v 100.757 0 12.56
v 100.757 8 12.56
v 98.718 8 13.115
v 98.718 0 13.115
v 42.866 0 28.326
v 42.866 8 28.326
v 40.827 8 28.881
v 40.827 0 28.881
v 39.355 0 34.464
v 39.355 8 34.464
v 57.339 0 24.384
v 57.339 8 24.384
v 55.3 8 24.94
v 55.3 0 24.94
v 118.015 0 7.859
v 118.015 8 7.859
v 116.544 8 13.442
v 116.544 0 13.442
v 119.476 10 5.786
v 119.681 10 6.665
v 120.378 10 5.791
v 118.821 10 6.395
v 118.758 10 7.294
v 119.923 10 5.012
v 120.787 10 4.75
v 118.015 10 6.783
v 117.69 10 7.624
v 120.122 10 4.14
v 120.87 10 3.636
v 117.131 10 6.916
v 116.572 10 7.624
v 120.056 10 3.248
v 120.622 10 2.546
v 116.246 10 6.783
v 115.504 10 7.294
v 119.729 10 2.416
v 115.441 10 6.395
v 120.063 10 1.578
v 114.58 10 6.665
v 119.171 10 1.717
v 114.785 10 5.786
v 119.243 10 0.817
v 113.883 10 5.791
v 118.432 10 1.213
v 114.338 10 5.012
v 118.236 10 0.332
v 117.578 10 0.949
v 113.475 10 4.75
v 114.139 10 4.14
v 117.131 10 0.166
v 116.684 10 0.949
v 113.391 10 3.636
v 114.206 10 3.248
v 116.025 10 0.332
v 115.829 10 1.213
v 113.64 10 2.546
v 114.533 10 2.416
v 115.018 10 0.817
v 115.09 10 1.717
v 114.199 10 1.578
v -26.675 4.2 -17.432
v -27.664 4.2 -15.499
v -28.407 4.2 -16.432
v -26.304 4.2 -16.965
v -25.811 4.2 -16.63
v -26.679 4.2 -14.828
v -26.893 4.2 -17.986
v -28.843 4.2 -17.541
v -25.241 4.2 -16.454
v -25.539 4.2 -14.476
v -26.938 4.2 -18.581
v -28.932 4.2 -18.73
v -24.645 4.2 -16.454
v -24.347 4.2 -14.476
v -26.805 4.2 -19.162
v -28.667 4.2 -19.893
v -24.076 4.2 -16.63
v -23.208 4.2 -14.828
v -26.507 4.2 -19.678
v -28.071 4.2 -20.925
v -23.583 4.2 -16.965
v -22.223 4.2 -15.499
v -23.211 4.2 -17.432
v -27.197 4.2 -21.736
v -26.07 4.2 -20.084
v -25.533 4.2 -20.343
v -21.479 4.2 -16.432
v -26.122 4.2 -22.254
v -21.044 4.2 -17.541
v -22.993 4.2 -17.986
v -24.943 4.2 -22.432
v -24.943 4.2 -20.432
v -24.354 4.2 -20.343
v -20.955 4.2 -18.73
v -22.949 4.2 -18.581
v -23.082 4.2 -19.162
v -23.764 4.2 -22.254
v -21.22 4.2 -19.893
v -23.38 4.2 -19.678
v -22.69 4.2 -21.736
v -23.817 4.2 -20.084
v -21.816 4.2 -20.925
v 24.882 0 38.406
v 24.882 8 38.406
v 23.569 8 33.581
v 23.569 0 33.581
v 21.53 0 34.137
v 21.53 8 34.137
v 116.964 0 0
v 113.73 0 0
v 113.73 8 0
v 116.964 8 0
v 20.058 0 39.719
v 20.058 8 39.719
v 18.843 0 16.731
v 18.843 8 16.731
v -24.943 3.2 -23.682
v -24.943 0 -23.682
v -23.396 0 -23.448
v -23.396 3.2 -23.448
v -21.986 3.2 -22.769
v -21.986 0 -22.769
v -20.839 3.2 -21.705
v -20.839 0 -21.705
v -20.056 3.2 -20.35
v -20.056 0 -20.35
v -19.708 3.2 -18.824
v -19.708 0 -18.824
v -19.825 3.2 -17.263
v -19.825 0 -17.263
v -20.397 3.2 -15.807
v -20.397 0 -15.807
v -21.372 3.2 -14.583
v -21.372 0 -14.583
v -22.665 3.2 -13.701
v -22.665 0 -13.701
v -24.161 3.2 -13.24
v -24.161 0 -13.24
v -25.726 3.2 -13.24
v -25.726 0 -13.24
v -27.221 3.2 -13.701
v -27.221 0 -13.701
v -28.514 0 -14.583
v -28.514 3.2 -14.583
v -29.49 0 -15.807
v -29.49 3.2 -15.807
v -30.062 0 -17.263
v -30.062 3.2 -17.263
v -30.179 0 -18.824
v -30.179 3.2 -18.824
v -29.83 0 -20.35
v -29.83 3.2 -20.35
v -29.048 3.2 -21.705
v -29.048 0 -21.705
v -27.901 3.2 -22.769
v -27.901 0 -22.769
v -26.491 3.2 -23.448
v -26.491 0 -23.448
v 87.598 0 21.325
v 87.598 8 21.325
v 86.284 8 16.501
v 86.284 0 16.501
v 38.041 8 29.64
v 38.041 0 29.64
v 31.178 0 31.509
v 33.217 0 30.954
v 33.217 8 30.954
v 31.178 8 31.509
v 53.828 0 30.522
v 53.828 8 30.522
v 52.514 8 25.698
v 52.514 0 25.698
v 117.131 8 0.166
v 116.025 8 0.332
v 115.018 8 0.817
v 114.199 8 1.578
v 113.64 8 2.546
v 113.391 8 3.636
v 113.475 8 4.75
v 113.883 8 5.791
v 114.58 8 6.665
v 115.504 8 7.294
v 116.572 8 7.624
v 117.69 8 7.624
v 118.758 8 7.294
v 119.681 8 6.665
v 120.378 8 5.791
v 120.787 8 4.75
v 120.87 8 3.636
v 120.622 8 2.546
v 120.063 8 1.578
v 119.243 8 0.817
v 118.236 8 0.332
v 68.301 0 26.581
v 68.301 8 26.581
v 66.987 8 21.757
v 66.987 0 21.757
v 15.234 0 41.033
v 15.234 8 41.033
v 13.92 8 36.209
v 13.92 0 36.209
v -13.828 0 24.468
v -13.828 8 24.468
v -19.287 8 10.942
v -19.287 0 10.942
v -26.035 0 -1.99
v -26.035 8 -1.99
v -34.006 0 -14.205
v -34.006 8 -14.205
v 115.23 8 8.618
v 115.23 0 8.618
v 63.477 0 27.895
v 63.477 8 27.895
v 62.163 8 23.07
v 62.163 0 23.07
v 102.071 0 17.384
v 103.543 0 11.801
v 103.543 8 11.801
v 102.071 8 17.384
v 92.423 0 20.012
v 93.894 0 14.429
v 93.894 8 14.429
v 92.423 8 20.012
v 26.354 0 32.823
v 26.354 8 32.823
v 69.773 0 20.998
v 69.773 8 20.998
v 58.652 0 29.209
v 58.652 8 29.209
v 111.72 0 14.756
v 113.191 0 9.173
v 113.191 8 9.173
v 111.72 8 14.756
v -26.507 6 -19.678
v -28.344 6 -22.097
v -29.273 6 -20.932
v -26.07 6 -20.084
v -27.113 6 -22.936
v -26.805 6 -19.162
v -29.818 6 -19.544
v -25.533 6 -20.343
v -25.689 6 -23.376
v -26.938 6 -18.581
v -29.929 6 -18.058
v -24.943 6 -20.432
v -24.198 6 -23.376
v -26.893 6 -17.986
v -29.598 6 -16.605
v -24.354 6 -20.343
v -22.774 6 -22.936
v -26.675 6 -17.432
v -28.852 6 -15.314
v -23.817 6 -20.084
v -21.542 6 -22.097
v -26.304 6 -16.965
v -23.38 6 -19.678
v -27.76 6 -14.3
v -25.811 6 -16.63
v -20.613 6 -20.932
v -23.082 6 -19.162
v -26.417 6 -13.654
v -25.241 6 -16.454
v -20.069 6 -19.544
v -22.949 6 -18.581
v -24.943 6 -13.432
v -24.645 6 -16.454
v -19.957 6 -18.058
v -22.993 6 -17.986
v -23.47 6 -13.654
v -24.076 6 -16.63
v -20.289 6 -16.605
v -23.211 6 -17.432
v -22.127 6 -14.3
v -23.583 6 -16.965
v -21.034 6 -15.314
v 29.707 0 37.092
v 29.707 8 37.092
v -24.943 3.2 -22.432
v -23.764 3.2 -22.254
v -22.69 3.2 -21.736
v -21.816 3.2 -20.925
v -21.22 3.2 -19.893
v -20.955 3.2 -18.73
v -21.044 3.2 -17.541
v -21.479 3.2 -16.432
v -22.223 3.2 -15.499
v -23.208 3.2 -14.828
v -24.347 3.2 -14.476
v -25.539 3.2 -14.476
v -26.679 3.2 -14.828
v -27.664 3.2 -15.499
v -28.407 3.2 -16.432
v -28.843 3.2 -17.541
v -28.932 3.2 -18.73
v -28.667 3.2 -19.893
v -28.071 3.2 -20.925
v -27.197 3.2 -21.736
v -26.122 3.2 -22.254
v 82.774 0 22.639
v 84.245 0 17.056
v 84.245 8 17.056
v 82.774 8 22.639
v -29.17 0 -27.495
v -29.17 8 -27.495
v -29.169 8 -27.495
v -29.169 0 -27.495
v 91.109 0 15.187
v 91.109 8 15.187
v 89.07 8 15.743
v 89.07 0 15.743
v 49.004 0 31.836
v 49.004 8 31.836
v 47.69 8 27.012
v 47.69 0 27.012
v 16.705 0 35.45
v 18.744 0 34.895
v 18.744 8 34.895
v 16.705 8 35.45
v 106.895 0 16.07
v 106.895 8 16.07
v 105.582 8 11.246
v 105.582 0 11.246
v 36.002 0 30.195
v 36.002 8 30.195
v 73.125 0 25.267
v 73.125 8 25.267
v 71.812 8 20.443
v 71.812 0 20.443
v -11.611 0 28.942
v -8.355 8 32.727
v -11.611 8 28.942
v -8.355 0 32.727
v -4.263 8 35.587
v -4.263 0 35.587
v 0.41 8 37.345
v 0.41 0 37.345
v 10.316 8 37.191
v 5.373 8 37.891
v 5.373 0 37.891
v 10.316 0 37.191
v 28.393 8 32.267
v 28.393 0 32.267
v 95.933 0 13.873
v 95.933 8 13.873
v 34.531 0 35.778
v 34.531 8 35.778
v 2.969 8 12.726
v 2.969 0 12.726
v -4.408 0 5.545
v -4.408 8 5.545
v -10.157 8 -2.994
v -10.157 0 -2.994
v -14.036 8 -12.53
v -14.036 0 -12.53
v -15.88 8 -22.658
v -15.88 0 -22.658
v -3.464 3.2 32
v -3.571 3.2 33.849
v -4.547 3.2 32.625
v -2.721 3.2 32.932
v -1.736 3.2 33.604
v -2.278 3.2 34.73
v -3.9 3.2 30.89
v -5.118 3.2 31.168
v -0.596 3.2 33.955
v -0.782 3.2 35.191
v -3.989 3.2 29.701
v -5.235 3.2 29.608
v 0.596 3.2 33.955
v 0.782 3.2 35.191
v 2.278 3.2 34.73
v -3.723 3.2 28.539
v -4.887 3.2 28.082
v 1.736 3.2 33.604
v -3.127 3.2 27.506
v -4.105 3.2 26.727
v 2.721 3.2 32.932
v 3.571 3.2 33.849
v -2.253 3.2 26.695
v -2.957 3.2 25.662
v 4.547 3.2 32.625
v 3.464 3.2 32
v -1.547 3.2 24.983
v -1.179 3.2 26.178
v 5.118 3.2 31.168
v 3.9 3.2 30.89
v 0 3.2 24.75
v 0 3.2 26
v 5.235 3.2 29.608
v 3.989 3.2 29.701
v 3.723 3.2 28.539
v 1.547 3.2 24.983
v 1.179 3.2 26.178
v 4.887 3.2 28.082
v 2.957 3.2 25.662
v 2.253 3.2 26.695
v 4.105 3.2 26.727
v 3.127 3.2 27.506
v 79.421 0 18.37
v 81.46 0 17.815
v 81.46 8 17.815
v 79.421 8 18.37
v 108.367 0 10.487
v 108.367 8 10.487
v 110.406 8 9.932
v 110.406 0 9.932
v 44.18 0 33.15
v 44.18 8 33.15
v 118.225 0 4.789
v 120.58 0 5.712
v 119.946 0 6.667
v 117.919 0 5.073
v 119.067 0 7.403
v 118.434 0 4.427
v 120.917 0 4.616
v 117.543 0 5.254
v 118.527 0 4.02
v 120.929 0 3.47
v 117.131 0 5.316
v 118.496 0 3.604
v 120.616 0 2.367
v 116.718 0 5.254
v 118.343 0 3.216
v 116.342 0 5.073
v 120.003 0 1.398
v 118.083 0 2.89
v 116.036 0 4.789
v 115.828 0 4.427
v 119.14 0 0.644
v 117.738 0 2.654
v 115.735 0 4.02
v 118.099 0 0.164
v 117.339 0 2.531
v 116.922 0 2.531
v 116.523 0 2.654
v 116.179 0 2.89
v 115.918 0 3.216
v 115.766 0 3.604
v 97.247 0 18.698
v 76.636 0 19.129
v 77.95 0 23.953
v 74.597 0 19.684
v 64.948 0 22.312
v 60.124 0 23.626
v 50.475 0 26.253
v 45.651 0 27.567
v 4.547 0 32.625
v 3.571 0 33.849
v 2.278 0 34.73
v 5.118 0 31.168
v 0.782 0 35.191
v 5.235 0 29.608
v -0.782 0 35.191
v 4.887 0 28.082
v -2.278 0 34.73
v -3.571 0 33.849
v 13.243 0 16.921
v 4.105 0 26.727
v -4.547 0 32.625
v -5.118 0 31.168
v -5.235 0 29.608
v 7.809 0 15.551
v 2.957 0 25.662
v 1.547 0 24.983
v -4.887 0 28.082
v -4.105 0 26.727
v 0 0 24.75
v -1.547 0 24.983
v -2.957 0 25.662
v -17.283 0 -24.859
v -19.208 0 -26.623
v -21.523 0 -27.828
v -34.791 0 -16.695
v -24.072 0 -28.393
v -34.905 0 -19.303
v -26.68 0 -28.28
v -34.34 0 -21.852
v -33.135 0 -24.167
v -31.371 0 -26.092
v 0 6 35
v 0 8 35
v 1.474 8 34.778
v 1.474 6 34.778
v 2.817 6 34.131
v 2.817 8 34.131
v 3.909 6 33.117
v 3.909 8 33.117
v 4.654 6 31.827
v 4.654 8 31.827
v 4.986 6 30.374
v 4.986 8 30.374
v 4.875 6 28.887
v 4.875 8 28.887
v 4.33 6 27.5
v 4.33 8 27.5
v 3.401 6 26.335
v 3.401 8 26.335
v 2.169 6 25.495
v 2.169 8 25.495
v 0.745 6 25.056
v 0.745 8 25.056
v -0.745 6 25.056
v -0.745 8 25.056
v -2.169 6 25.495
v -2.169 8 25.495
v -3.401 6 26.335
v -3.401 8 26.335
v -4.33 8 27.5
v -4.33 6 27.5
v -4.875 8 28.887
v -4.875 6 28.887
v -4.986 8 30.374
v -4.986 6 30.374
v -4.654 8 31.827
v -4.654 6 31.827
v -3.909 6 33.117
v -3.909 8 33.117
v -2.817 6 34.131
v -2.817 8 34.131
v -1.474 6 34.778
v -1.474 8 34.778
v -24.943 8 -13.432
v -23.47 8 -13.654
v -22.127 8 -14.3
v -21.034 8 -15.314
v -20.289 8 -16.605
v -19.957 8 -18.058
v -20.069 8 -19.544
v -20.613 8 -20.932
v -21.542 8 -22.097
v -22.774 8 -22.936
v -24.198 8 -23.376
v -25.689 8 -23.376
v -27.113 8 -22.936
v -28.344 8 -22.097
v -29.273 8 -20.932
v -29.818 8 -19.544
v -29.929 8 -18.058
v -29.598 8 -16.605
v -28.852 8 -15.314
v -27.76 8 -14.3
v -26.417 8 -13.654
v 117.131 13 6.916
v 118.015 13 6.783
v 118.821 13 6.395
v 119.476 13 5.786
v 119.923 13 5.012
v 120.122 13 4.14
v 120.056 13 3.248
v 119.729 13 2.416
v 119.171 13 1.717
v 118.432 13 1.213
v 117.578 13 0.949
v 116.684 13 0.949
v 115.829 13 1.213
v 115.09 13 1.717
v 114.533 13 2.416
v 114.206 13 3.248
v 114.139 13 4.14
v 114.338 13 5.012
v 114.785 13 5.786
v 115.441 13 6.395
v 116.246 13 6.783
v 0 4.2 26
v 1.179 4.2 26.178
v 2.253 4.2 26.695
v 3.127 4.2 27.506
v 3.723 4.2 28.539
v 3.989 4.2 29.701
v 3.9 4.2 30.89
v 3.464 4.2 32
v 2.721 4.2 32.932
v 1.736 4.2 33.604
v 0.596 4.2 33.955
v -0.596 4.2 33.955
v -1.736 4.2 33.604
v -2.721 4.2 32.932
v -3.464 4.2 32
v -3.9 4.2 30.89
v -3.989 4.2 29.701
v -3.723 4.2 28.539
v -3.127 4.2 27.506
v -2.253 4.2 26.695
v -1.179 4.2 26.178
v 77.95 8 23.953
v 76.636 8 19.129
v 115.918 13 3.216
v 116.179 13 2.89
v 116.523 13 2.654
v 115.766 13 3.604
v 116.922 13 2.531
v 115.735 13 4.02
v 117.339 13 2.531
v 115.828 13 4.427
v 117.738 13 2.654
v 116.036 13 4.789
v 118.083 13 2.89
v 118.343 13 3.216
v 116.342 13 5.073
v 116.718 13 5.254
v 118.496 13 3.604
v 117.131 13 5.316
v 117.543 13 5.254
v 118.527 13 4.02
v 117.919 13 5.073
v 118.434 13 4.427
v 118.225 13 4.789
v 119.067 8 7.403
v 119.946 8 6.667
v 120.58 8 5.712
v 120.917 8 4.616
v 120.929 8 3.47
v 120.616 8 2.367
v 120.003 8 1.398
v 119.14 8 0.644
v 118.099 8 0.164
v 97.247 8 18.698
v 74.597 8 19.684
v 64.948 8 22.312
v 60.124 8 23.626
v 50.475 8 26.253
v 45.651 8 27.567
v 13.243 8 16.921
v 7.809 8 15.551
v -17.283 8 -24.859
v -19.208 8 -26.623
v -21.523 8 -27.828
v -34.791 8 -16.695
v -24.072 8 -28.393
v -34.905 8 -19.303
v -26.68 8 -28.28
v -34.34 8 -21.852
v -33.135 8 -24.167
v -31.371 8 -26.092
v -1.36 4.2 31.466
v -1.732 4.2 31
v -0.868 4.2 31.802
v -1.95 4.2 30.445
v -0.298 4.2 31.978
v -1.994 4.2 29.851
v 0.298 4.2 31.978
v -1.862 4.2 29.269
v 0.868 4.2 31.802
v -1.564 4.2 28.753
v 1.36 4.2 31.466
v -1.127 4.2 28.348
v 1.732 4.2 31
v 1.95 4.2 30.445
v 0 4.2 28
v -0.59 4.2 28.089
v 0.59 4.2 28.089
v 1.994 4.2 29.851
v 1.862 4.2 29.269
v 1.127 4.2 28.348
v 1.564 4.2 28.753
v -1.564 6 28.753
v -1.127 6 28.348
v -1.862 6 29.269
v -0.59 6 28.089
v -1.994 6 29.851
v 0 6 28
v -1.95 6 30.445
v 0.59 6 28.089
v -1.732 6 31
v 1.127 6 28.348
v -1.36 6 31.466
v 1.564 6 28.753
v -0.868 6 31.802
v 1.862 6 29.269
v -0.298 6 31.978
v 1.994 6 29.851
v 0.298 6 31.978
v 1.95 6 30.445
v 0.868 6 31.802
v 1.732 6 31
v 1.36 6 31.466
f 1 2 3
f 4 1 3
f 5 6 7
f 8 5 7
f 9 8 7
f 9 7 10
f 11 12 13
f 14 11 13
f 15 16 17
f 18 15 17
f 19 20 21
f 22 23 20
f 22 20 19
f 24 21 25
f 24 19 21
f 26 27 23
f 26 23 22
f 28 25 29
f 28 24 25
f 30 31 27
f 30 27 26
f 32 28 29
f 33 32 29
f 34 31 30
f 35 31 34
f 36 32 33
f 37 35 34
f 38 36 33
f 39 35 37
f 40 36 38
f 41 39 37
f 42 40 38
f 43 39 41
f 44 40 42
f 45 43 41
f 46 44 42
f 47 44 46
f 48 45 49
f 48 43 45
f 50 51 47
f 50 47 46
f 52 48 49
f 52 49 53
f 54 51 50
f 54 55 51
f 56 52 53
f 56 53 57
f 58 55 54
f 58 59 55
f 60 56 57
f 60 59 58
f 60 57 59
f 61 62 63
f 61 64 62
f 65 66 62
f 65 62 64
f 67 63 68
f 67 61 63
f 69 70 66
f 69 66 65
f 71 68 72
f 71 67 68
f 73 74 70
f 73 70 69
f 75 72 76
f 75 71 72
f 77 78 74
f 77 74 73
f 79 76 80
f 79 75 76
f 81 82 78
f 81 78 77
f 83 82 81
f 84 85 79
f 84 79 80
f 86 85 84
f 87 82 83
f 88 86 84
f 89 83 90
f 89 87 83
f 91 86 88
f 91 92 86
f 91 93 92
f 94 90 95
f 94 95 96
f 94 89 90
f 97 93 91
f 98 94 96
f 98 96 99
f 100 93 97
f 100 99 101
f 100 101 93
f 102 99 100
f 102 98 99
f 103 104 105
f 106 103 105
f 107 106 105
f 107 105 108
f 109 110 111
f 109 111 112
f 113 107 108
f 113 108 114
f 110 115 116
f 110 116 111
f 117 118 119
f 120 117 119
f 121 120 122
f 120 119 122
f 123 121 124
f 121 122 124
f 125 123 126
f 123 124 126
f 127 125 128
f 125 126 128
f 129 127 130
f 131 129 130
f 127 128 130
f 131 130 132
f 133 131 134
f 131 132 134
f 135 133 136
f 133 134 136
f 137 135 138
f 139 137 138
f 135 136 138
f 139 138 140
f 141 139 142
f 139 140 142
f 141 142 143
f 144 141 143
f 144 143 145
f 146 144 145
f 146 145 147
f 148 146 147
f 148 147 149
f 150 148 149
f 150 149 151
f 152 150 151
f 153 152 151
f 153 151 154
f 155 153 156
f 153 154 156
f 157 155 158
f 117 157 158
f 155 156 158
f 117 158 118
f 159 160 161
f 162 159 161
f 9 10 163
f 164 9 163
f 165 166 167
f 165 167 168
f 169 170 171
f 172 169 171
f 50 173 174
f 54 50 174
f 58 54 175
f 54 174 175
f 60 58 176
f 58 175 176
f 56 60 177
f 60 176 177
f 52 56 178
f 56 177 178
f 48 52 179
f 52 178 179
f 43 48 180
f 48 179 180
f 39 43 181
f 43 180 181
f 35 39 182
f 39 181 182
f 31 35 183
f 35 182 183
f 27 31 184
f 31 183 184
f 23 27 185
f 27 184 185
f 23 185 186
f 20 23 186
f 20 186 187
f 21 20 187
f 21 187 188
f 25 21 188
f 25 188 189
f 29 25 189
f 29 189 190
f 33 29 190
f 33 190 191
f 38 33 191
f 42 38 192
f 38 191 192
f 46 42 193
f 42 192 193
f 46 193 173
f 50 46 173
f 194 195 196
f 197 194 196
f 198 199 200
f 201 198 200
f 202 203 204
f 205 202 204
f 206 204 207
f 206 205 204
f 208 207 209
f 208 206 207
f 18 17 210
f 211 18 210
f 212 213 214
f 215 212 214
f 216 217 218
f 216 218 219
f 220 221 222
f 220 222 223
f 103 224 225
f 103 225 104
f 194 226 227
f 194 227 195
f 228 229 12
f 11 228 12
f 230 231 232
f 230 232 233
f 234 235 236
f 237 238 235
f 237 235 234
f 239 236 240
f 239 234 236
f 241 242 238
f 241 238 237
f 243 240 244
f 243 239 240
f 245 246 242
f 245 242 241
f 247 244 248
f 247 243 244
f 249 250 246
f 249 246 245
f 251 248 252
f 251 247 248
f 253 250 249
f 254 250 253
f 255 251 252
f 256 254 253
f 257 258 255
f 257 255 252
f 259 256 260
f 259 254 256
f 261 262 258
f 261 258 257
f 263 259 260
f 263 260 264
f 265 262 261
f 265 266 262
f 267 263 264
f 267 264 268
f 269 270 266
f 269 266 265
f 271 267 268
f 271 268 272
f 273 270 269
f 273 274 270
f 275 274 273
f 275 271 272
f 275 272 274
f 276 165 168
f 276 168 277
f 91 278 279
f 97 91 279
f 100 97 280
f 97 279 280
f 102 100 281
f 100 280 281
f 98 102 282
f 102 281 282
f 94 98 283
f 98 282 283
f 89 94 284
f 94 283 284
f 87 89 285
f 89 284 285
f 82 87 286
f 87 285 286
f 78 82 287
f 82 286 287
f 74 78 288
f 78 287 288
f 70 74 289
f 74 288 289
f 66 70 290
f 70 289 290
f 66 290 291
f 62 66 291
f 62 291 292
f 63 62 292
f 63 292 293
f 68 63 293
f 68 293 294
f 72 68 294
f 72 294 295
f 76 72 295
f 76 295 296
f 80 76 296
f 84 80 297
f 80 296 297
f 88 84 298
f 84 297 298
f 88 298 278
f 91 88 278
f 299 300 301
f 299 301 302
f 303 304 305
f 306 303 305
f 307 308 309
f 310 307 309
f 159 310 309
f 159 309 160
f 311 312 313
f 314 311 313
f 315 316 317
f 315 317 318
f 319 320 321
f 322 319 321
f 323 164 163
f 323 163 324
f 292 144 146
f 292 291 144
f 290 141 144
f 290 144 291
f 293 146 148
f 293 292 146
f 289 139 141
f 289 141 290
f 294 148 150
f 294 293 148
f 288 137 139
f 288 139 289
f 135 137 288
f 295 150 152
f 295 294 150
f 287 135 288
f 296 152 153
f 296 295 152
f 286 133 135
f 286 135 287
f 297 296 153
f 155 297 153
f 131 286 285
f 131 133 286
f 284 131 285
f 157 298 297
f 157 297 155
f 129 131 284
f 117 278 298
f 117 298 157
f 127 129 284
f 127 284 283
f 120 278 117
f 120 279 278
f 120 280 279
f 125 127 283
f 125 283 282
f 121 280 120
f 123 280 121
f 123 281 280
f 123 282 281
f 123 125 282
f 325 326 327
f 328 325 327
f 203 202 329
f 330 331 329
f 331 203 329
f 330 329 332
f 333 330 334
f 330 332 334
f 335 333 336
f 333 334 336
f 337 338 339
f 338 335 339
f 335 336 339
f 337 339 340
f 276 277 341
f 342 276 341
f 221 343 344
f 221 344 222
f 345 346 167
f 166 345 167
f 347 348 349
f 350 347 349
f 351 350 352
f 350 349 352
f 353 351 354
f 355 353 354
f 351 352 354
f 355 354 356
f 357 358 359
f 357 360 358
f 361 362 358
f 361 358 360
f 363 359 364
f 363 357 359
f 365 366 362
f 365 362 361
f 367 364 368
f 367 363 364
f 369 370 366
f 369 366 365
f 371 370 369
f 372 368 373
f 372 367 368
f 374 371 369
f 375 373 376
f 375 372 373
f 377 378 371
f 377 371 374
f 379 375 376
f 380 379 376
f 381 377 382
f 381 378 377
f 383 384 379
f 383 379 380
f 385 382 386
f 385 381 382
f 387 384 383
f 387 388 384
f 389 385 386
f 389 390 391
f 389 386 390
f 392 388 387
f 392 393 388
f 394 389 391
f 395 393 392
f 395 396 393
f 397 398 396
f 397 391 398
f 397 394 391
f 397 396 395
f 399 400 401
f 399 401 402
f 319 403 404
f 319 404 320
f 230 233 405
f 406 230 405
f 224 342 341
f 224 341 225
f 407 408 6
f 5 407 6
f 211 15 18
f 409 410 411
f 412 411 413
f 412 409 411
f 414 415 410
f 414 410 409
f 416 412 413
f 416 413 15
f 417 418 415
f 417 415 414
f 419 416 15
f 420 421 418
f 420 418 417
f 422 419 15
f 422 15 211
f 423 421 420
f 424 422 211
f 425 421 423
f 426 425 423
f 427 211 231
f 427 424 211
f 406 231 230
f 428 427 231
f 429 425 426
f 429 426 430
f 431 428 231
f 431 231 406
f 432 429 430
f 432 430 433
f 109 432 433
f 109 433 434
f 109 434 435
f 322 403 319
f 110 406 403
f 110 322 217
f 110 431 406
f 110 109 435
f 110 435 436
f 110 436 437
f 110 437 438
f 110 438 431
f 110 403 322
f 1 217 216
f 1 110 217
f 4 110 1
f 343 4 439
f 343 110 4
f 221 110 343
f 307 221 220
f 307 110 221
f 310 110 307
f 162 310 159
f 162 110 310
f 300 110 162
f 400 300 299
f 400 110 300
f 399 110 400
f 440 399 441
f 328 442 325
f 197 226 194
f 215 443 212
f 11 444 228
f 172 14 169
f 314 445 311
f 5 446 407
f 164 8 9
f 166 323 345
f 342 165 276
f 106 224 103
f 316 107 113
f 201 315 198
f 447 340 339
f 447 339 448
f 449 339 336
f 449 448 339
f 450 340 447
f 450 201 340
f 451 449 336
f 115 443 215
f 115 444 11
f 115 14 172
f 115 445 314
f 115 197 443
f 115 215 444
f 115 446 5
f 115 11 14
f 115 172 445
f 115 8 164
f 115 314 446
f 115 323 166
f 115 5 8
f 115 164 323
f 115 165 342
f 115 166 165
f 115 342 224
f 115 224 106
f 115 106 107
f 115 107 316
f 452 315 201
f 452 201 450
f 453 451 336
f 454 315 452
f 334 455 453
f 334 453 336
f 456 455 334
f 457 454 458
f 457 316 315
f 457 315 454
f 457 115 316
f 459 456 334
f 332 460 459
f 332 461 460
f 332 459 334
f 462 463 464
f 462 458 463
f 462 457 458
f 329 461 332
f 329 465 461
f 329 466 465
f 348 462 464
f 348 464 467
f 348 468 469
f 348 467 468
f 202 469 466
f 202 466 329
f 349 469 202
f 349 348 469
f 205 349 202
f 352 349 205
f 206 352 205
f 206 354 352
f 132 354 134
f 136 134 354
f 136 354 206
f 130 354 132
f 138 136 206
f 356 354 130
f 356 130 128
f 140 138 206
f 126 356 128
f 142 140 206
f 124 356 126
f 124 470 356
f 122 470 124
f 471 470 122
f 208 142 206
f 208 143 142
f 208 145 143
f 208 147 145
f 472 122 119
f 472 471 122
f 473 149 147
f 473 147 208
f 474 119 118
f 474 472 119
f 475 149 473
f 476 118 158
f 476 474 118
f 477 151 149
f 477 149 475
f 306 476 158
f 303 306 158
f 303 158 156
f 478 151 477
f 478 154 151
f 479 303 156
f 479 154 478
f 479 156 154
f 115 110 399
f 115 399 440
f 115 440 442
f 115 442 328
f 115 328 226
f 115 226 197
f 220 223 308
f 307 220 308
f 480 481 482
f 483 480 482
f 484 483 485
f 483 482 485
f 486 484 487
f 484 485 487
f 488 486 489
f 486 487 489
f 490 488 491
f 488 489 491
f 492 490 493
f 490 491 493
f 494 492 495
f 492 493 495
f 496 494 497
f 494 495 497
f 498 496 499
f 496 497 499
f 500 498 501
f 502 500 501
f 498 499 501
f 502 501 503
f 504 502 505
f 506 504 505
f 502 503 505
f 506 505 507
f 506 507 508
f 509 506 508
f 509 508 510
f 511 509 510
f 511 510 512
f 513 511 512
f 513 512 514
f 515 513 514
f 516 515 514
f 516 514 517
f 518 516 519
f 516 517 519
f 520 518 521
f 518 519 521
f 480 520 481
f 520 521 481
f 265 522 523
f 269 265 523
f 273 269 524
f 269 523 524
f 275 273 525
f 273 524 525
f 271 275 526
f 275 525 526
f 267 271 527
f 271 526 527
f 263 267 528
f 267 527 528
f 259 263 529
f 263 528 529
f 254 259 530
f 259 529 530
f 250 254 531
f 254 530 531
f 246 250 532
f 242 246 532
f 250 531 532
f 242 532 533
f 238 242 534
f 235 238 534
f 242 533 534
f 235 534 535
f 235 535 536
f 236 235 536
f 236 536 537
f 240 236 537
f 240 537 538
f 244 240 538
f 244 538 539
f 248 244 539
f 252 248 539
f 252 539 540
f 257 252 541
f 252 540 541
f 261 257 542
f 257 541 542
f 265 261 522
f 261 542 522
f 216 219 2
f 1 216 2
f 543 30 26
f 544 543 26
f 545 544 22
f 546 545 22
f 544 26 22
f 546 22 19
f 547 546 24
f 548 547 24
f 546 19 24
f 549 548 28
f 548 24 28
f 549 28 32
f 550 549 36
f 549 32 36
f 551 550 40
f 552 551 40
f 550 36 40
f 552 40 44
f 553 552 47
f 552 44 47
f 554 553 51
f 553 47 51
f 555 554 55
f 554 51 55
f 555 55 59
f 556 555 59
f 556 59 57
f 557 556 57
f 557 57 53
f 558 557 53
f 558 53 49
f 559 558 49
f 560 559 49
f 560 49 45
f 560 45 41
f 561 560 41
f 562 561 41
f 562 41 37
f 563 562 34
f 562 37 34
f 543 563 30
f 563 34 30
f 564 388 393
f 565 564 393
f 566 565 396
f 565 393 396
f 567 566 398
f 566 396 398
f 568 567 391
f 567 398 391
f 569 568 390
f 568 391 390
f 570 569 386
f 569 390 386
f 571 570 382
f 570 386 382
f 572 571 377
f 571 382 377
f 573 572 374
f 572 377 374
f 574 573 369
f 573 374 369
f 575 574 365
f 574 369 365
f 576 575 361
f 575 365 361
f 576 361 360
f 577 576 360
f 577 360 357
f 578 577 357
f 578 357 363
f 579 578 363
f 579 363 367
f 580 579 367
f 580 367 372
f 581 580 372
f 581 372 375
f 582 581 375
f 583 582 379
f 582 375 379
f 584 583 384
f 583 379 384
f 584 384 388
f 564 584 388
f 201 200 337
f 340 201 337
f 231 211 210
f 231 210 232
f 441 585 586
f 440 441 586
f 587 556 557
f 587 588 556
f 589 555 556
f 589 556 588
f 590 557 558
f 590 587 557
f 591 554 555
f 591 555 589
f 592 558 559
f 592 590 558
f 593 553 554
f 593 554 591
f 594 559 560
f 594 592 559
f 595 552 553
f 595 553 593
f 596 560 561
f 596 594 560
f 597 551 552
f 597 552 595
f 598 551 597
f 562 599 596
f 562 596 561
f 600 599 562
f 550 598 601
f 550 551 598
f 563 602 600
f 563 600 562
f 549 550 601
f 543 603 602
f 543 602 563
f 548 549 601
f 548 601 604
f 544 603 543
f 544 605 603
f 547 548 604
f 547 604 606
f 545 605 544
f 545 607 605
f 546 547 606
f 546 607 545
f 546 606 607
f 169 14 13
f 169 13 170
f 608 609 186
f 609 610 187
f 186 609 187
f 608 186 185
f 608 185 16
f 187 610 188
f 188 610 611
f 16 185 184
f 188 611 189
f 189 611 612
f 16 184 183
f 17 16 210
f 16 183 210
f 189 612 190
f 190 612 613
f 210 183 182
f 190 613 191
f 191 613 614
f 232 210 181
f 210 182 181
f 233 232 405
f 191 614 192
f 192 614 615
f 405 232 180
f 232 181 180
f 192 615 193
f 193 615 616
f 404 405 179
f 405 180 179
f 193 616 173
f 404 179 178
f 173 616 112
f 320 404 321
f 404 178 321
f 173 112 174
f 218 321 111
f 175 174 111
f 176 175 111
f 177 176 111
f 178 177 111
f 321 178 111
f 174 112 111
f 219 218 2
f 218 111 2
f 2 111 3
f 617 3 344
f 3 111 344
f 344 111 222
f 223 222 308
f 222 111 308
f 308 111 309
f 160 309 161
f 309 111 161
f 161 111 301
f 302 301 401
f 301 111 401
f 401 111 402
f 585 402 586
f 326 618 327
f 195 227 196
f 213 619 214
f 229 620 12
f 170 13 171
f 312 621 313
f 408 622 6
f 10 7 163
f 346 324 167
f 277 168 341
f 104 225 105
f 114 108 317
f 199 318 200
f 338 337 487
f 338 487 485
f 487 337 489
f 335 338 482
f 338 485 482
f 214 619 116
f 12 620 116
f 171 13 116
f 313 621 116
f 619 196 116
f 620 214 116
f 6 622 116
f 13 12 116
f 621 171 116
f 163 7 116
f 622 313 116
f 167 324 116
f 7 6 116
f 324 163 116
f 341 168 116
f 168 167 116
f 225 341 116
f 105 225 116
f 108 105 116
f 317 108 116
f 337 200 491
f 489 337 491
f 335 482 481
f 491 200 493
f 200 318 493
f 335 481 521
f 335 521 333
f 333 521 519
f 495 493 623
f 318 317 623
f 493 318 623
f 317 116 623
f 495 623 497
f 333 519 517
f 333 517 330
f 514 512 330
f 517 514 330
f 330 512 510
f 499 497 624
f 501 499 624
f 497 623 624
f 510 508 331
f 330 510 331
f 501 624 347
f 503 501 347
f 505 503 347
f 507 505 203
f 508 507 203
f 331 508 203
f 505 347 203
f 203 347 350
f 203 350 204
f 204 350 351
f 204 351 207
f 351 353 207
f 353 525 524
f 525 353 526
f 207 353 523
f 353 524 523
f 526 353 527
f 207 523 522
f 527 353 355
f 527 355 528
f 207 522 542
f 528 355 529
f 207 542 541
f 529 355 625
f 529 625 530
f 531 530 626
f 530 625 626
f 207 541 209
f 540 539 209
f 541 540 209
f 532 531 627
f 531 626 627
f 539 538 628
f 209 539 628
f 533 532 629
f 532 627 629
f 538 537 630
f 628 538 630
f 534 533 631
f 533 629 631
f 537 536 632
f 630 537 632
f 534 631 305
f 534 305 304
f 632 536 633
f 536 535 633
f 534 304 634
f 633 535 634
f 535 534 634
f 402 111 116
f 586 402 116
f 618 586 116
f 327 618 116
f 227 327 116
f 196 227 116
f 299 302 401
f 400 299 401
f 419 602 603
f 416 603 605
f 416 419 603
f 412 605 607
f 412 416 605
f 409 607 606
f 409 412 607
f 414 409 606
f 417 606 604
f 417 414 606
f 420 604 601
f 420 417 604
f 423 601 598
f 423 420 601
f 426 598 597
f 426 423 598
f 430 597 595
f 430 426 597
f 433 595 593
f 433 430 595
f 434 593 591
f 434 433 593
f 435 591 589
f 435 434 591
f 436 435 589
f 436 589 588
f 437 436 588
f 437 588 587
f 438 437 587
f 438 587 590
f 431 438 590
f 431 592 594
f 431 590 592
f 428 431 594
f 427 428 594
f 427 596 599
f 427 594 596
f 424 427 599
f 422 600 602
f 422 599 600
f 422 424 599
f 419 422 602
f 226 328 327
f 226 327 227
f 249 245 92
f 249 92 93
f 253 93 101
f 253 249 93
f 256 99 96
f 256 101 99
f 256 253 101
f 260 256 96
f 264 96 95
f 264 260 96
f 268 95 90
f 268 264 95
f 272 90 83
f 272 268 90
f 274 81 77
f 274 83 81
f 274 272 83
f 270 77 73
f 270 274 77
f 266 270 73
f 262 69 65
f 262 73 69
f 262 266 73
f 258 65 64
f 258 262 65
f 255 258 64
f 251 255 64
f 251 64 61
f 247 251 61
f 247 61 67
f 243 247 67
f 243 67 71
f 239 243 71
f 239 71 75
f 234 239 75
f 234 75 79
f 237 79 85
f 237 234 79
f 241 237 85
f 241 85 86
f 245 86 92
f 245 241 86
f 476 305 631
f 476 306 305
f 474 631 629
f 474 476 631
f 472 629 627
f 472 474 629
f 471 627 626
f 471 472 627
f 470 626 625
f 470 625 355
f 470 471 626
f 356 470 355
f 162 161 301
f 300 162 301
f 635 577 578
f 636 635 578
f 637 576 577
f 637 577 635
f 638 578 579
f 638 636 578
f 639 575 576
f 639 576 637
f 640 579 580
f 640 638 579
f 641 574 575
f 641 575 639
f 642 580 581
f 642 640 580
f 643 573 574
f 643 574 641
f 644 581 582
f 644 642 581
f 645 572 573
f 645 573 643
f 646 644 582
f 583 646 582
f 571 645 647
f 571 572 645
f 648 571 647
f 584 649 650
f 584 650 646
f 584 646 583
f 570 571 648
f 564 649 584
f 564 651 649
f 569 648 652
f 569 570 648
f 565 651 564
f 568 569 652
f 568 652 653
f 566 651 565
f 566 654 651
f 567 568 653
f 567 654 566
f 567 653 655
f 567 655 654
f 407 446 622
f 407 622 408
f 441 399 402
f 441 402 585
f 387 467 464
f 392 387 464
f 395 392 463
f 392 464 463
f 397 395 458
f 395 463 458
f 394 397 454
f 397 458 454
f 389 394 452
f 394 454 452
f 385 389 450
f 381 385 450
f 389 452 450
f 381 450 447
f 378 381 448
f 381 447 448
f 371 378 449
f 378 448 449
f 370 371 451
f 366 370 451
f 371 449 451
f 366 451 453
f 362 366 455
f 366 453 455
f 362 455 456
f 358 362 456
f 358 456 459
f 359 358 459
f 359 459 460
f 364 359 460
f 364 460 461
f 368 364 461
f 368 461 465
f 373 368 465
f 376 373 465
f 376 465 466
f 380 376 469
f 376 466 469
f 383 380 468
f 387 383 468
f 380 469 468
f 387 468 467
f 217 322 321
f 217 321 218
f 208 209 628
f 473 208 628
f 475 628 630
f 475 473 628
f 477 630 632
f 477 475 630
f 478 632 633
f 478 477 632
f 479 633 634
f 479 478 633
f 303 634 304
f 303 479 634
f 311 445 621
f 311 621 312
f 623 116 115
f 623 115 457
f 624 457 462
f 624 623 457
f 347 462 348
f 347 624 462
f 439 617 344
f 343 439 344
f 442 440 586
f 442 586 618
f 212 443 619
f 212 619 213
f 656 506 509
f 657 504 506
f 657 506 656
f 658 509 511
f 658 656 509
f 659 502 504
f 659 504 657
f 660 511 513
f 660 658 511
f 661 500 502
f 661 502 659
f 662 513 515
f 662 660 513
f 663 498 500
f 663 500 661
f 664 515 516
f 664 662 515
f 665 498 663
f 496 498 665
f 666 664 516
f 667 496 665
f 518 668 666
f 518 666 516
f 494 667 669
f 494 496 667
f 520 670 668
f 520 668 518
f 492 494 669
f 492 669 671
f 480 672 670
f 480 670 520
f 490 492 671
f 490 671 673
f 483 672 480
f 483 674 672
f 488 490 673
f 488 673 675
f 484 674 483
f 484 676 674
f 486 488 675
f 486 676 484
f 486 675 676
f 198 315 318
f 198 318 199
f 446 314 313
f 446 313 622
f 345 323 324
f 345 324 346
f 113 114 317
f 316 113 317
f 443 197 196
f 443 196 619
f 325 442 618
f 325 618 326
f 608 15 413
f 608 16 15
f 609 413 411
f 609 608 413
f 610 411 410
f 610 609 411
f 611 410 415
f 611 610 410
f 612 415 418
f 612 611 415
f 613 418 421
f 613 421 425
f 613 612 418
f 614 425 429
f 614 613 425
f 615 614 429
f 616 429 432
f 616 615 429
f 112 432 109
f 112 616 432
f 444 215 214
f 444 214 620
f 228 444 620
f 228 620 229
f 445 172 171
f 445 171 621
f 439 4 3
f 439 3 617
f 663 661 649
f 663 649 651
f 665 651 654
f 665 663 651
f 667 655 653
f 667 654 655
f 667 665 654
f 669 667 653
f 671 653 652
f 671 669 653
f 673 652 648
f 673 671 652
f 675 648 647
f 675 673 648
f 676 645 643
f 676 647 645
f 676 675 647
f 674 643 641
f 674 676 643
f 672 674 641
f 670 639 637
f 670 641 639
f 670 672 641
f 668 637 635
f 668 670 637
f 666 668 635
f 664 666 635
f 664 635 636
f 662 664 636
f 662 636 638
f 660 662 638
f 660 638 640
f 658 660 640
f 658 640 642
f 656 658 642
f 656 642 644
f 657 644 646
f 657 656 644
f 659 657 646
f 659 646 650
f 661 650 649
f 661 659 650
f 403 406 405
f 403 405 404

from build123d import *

# Parameters (mm, degrees)
SKETCH1_R                = 1.4
BOSS_EXTRUDE1_DEPTH      = 8
SKETCH2_R                = 3.75
BOSS_EXTRUDE2_DEPTH      = 2
SKETCH3_R                = 3
BOSS_EXTRUDE3_DEPTH      = 3
CUT_EXTRUDE1_DEPTH       = 153.777621068
CUT_EXTRUDE1_DEPTH_BACK  = 153.777621068
SKETCH4_R                = 1.4
FILLET1_R                = 4
SKETCH5_R                = 5.1
CUT_EXTRUDE2_DEPTH       = 3.2
SKETCH6_R                = 4
CUT_EXTRUDE3_DEPTH       = 1
SKETCH7_R                = 5
CUT_EXTRUDE4_DEPTH       = 2
CUT_EXTRUDE5_DEPTH       = 128.709870942
CUT_EXTRUDE5_DEPTH_BACK  = 128.709870942
SKETCH8_R                = 2
SKETCH9_W                = 150
SKETCH9_H                = 50
CUT_EXTRUDE6_DEPTH       = 128.657240829
BOSS_EXTRUDE4_DEPTH      = 8
FILLET2_R                = 10
SKETCH11_R               = 5.25
CUT_EXTRUDE7_DEPTH       = 3.2
SKETCH12_R               = 4
CUT_EXTRUDE8_DEPTH       = 1
SKETCH13_R               = 5
CUT_EXTRUDE9_DEPTH       = 2
CUT_EXTRUDE10_DEPTH      = 128.709870942
CUT_EXTRUDE10_DEPTH_BACK = 128.709870942
SKETCH14_R               = 2
CUT_EXTRUDE11_DEPTH      = 128.657240829
CUT_EXTRUDE11_DEPTH_BACK = 128.657240829
FILLET3_R                = 20
CUT_EXTRUDE12_DEPTH      = 128.657240829
CUT_EXTRUDE12_DEPTH_BACK = 128.657240829
FILLET4_R                = 20
FILLET5_R                = 20
BOSS_EXTRUDE5_DEPTH      = 8
LPATTERN1_COUNT          = 22
LPATTERN1_PITCH          = 5
SKETCH19_R               = 5.25
CUT_EXTRUDE13_DEPTH      = 3.2
SKETCH20_R               = 4
CUT_EXTRUDE14_DEPTH      = 1
CUT_EXTRUDE15_DEPTH      = 129.03726605
CUT_EXTRUDE15_DEPTH_BACK = 129.03726605
SKETCH21_R               = 2
SKETCH22_R               = 5
CUT_EXTRUDE16_DEPTH      = 2


# Some blends are built 0.0001 mm under size
with BuildPart() as part:
    # Sketch1 → Boss-Extrude1 (new body)
    with BuildSketch(Plane(origin=(0, 0, 0), x_dir=(1, 0, 0), z_dir=(0, 1, 0))):
        Polygon((-146.874100845, 0), (146.874100845, 0), (0, -40), align=None)
        with Locations(Location((-117.130755004, -3.915785767, 0), (0, 0, 270))):
            Circle(SKETCH1_R, mode=Mode.SUBTRACT)
        with Locations(Location((0, -30, 0), (0, 0, 270))):
            Circle(SKETCH1_R, mode=Mode.SUBTRACT)
        with Locations(Location((117.130755004, -3.915785767, 0), (0, 0, 270))):
            Circle(SKETCH1_R, mode=Mode.SUBTRACT)
    extrude(amount=BOSS_EXTRUDE1_DEPTH)

    # Sketch2 → Boss-Extrude2 (add)
    with BuildSketch(Plane(origin=(0, 8, 0), x_dir=(1, 0, 0), z_dir=(0, 1, 0))):
        with Locations(Location((117.130755004, -3.915785767, 0), (0, 0, 90))):
            Circle(SKETCH2_R)
    extrude(amount=BOSS_EXTRUDE2_DEPTH)

    # Sketch3 → Boss-Extrude3 (add)
    with BuildSketch(Plane(origin=(0, 10, 0), x_dir=(1, 0, 0), z_dir=(0, 1, 0))):
        with Locations(Location((117.130755004, -3.915785767, 0), (0, 0, 270))):
            Circle(SKETCH3_R)
    extrude(amount=BOSS_EXTRUDE3_DEPTH)

    # Sketch4 → Cut-Extrude1 (cut, two sides: drawn at the far end of the back side and taken through both)
    with BuildSketch(Plane(origin=(0, 13, 0), x_dir=(1, 0, 0), z_dir=(0, 1, 0)).offset(-CUT_EXTRUDE1_DEPTH_BACK)):
        with Locations(Location((117.130755004, -3.915785767, 0), (0, 0, 270))):
            Circle(SKETCH4_R)
    extrude(amount=CUT_EXTRUDE1_DEPTH + CUT_EXTRUDE1_DEPTH_BACK, mode=Mode.SUBTRACT)

    # Fillet1
    fillet1_edges = [part.edges().sort_by_distance(p)[0] for p in [
        (-146.874100845, 4, 0),
        (146.874100845, 4, 0),
    ]]
    fillet(fillet1_edges, radius=FILLET1_R)

    # Sketch5 → Cut-Extrude2 (cut)
    with BuildSketch(Plane.XZ):
        with Locations((-117.130755004, 3.915785767)):
            Circle(SKETCH5_R)
    extrude(amount=-CUT_EXTRUDE2_DEPTH, mode=Mode.SUBTRACT)

    # Sketch6 → Cut-Extrude3 (cut)
    with BuildSketch(Plane.XZ.offset(-3.2)):
        with Locations((-117.130755004, 3.915785767)):
            Circle(SKETCH6_R)
    extrude(amount=-CUT_EXTRUDE3_DEPTH, mode=Mode.SUBTRACT)

    # Sketch7 → Cut-Extrude4 (cut)
    with BuildSketch(Plane(origin=(0, 8, 0), x_dir=(1, 0, 0), z_dir=(0, 1, 0))):
        with Locations((-117.130755004, -3.915785767)):
            Circle(SKETCH7_R)
    extrude(amount=-CUT_EXTRUDE4_DEPTH, mode=Mode.SUBTRACT)

    # Sketch8 → Cut-Extrude5 (cut, two sides: drawn at the far end of the back side and taken through both)
    with BuildSketch(Plane.XZ.offset(-4.2).offset(-CUT_EXTRUDE5_DEPTH_BACK)):
        with Locations(Location((-117.130755004, 3.915785767, 0), (0, 0, 270))):
            Circle(SKETCH8_R)
    extrude(amount=CUT_EXTRUDE5_DEPTH + CUT_EXTRUDE5_DEPTH_BACK, mode=Mode.SUBTRACT)

    # Sketch9 → Cut-Extrude6 (cut, through all)
    with BuildSketch(Plane(origin=(0, 8, 0), x_dir=(1, 0, 0), z_dir=(0, 1, 0))):
        with Locations((-85, -25)):
            Rectangle(SKETCH9_W, SKETCH9_H)
    extrude(amount=-CUT_EXTRUDE6_DEPTH, mode=Mode.SUBTRACT)

    # Sketch10 → Boss-Extrude4 (add)
    with BuildSketch(Plane(origin=(0, 8, 0), x_dir=(1, 0, 0), z_dir=(0, 1, 0))):
        Polygon((-10, -37.276579072), (-38.232590814, 23.268407311), (-20.106435073, 31.720772546), (-5.314795912, 0), (-10, 0), align=None)
    extrude(amount=-BOSS_EXTRUDE4_DEPTH)

    # Fillet2
    fillet2_edges = [part.edges().sort_by_distance(p)[0] for p in [
        (-20.106435073, 4, -31.720772546),
        (-38.232590814, 4, -23.268407311),
    ]]
    fillet(fillet2_edges, radius=FILLET2_R - 0.0001)  # a hair under: the kernel refuses the full size

    # Sketch11 → Cut-Extrude7 (cut)
    with BuildSketch(Plane.XZ):
        with Locations(Location((-24.943330326, -18.431512059, 0), (0, 0, 270))):
            Circle(SKETCH11_R)
    extrude(amount=-CUT_EXTRUDE7_DEPTH, mode=Mode.SUBTRACT)

    # Sketch12 → Cut-Extrude8 (cut)
    with BuildSketch(Plane.XZ.offset(-3.2)):
        with Locations(Location((-24.943330326, -18.431512059, 0), (0, 0, 270))):
            Circle(SKETCH12_R)
    extrude(amount=-CUT_EXTRUDE8_DEPTH, mode=Mode.SUBTRACT)

    # Sketch13 → Cut-Extrude9 (cut)
    with BuildSketch(Plane(origin=(0, 8, 0), x_dir=(1, 0, 0), z_dir=(0, 1, 0))):
        with Locations(Location((-24.943330326, 18.431512059, 0), (0, 0, 270))):
            Circle(SKETCH13_R)
    extrude(amount=-CUT_EXTRUDE9_DEPTH, mode=Mode.SUBTRACT)

    # Sketch14 → Cut-Extrude10 (cut, two sides: drawn at the far end of the back side and taken through both)
    with BuildSketch(Plane.XZ.offset(-4.2).offset(-CUT_EXTRUDE10_DEPTH_BACK)):
        with Locations(Location((-24.943330326, -18.431512059, 0), (0, 0, 270))):
            Circle(SKETCH14_R)
    extrude(amount=CUT_EXTRUDE10_DEPTH + CUT_EXTRUDE10_DEPTH_BACK, mode=Mode.SUBTRACT)

    # Sketch16 → Cut-Extrude11 (cut, two sides: drawn at the far end of the back side and taken through both)
    with BuildSketch(Plane(origin=(0, 8, 0), x_dir=(1, 0, 0), z_dir=(0, 1, 0)).offset(-CUT_EXTRUDE11_DEPTH_BACK)):
        Polygon((-5.314795912, 0), (3.729692447, -19.395967878), (113.729692447, 0), align=None)
    extrude(amount=CUT_EXTRUDE11_DEPTH + CUT_EXTRUDE11_DEPTH_BACK, mode=Mode.SUBTRACT)

    # Fillet3
    fillet3_edges = [part.edges().sort_by_distance(p)[0] for p in [
        (3.729692447, 4, 19.395967878),
    ]]
    fillet(fillet3_edges, radius=FILLET3_R)

    # Sketch17 → Cut-Extrude12 (cut, two sides: drawn at the far end of the back side and taken through both)
    with BuildSketch(Plane(origin=(0, 8, 0), x_dir=(1, 0, 0), z_dir=(0, 1, 0)).offset(-CUT_EXTRUDE12_DEPTH_BACK)):
        with BuildLine():
            Line((-34.006408196, 14.205329441), (-10, -37.276579072))
            ThreePointArc((-10, -37.276579072), (-19.543978786, -10.388869219), (-34.006408196, 14.205329441))
        make_face()
        with BuildLine():
            Line((-15.880252455, 22.657694676), (2.969031552, -12.726090006))
            ThreePointArc((2.969031552, -12.726090006), (-10.157316426, 2.993867794), (-15.880252455, 22.657694676))
        make_face()
    extrude(amount=CUT_EXTRUDE12_DEPTH + CUT_EXTRUDE12_DEPTH_BACK, mode=Mode.SUBTRACT)

    # Fillet4
    # the kernel refuses this fillet: 20 mm, written as the material it takes off along each edge
    with BuildSketch(Plane(origin=(-10, -26.307947418, 37.276579072), x_dir=(-0.2772397367749404, 0, -0.9608007745380734), z_dir=(0, 1, 0))) as fillet4_piece_1:
        with BuildLine():
            CenterArc((11.224724232, -19.987692069), FILLET4_R, 92.010191512, 54.159422267)
            Line((-5.389062305, -8.852967244), (-5.721338035, -8.630272748))
            ThreePointArc((-5.721338035, -8.630272748), (-3.036205438, -4.218496406), (-0.341674286, 0.207987217))
            Line((-0.341674286, 0.207987217), (0.014030905, 0.399753841))
            ThreePointArc((0.014030905, 0.399753841), (5.261589484, 0.307690517), (10.509148062, 0.399753841))
            Line((10.509148062, 0.399753841), (10.523178967, 0))
        make_face()
    extrude(amount=60.615894837, mode=Mode.SUBTRACT)

    # Fillet5
    # the kernel refuses this fillet: 20 mm, written as the material it takes off along each edge
    with BuildSketch(Plane(origin=(0, -51.987814503, 40), x_dir=(-0.6649550163020994, 0, -0.746883408769183), z_dir=(0, 1, 0))) as fillet5_piece_1:
        with BuildLine():
            CenterArc((13.146071877, -18.479501456), FILLET5_R, 67.51430871, 86.041392207)
            Line((-4.761282448, -9.572949875), (-6.552017881, -8.682294717))
            Line((-6.552017881, -8.682294717), (-1.790735433, 0.890655158))
            Line((-1.790735433, 0.890655158), (-1.017670329, 1.721727941))
            ThreePointArc((-1.017670329, 1.721727941), (18.974933836, 2.946825813), (21.560031193, 1.847950146))
            Line((21.560031193, 1.847950146), (20.795125801, 0))
        make_face()
    extrude(amount=111.975629005, mode=Mode.SUBTRACT)

    # Sketch18 → Boss-Extrude5 (add)
    with BuildSketch(Plane(origin=(0, 8, 0), x_dir=(1, 0, 0), z_dir=(0, 1, 0))):
        Polygon((118.015424178, -7.859432398), (116.543976131, -13.442278803), (115.230118761, -8.617988305), align=None)
    boss_extrude5 = extrude(amount=-BOSS_EXTRUDE5_DEPTH)

    # LPattern1: Boss-Extrude5 ×22
    with Locations(*[Vector(-0.9648580996210196, 0, 0.26277147409053875) * (i * LPATTERN1_PITCH) for i in range(1, LPATTERN1_COUNT)]):
        add(boss_extrude5)

    # Sketch19 → Cut-Extrude13 (cut)
    with BuildSketch(Plane.XZ):
        with Locations(Location((0, 30, 0), (0, 0, 270))):
            Circle(SKETCH19_R)
    extrude(amount=-CUT_EXTRUDE13_DEPTH, mode=Mode.SUBTRACT)

    # Sketch20 → Cut-Extrude14 (cut)
    with BuildSketch(Plane.XZ.offset(-3.2)):
        with Locations(Location((0, 30, 0), (0, 0, 270))):
            Circle(SKETCH20_R)
    extrude(amount=-CUT_EXTRUDE14_DEPTH, mode=Mode.SUBTRACT)

    # Sketch21 → Cut-Extrude15 (cut, two sides: drawn at the far end of the back side and taken through both)
    with BuildSketch(Plane.XZ.offset(-4.2).offset(-CUT_EXTRUDE15_DEPTH_BACK)):
        with Locations(Location((0, 30, 0), (0, 0, 270))):
            Circle(SKETCH21_R)
    extrude(amount=CUT_EXTRUDE15_DEPTH + CUT_EXTRUDE15_DEPTH_BACK, mode=Mode.SUBTRACT)

    # Sketch22 → Cut-Extrude16 (cut)
    with BuildSketch(Plane(origin=(0, 8, 0), x_dir=(1, 0, 0), z_dir=(0, 1, 0))):
        with Locations(Location((0, -30, 0), (0, 0, 270))):
            Circle(SKETCH22_R)
    extrude(amount=-CUT_EXTRUDE16_DEPTH, mode=Mode.SUBTRACT)


solid = part.part
